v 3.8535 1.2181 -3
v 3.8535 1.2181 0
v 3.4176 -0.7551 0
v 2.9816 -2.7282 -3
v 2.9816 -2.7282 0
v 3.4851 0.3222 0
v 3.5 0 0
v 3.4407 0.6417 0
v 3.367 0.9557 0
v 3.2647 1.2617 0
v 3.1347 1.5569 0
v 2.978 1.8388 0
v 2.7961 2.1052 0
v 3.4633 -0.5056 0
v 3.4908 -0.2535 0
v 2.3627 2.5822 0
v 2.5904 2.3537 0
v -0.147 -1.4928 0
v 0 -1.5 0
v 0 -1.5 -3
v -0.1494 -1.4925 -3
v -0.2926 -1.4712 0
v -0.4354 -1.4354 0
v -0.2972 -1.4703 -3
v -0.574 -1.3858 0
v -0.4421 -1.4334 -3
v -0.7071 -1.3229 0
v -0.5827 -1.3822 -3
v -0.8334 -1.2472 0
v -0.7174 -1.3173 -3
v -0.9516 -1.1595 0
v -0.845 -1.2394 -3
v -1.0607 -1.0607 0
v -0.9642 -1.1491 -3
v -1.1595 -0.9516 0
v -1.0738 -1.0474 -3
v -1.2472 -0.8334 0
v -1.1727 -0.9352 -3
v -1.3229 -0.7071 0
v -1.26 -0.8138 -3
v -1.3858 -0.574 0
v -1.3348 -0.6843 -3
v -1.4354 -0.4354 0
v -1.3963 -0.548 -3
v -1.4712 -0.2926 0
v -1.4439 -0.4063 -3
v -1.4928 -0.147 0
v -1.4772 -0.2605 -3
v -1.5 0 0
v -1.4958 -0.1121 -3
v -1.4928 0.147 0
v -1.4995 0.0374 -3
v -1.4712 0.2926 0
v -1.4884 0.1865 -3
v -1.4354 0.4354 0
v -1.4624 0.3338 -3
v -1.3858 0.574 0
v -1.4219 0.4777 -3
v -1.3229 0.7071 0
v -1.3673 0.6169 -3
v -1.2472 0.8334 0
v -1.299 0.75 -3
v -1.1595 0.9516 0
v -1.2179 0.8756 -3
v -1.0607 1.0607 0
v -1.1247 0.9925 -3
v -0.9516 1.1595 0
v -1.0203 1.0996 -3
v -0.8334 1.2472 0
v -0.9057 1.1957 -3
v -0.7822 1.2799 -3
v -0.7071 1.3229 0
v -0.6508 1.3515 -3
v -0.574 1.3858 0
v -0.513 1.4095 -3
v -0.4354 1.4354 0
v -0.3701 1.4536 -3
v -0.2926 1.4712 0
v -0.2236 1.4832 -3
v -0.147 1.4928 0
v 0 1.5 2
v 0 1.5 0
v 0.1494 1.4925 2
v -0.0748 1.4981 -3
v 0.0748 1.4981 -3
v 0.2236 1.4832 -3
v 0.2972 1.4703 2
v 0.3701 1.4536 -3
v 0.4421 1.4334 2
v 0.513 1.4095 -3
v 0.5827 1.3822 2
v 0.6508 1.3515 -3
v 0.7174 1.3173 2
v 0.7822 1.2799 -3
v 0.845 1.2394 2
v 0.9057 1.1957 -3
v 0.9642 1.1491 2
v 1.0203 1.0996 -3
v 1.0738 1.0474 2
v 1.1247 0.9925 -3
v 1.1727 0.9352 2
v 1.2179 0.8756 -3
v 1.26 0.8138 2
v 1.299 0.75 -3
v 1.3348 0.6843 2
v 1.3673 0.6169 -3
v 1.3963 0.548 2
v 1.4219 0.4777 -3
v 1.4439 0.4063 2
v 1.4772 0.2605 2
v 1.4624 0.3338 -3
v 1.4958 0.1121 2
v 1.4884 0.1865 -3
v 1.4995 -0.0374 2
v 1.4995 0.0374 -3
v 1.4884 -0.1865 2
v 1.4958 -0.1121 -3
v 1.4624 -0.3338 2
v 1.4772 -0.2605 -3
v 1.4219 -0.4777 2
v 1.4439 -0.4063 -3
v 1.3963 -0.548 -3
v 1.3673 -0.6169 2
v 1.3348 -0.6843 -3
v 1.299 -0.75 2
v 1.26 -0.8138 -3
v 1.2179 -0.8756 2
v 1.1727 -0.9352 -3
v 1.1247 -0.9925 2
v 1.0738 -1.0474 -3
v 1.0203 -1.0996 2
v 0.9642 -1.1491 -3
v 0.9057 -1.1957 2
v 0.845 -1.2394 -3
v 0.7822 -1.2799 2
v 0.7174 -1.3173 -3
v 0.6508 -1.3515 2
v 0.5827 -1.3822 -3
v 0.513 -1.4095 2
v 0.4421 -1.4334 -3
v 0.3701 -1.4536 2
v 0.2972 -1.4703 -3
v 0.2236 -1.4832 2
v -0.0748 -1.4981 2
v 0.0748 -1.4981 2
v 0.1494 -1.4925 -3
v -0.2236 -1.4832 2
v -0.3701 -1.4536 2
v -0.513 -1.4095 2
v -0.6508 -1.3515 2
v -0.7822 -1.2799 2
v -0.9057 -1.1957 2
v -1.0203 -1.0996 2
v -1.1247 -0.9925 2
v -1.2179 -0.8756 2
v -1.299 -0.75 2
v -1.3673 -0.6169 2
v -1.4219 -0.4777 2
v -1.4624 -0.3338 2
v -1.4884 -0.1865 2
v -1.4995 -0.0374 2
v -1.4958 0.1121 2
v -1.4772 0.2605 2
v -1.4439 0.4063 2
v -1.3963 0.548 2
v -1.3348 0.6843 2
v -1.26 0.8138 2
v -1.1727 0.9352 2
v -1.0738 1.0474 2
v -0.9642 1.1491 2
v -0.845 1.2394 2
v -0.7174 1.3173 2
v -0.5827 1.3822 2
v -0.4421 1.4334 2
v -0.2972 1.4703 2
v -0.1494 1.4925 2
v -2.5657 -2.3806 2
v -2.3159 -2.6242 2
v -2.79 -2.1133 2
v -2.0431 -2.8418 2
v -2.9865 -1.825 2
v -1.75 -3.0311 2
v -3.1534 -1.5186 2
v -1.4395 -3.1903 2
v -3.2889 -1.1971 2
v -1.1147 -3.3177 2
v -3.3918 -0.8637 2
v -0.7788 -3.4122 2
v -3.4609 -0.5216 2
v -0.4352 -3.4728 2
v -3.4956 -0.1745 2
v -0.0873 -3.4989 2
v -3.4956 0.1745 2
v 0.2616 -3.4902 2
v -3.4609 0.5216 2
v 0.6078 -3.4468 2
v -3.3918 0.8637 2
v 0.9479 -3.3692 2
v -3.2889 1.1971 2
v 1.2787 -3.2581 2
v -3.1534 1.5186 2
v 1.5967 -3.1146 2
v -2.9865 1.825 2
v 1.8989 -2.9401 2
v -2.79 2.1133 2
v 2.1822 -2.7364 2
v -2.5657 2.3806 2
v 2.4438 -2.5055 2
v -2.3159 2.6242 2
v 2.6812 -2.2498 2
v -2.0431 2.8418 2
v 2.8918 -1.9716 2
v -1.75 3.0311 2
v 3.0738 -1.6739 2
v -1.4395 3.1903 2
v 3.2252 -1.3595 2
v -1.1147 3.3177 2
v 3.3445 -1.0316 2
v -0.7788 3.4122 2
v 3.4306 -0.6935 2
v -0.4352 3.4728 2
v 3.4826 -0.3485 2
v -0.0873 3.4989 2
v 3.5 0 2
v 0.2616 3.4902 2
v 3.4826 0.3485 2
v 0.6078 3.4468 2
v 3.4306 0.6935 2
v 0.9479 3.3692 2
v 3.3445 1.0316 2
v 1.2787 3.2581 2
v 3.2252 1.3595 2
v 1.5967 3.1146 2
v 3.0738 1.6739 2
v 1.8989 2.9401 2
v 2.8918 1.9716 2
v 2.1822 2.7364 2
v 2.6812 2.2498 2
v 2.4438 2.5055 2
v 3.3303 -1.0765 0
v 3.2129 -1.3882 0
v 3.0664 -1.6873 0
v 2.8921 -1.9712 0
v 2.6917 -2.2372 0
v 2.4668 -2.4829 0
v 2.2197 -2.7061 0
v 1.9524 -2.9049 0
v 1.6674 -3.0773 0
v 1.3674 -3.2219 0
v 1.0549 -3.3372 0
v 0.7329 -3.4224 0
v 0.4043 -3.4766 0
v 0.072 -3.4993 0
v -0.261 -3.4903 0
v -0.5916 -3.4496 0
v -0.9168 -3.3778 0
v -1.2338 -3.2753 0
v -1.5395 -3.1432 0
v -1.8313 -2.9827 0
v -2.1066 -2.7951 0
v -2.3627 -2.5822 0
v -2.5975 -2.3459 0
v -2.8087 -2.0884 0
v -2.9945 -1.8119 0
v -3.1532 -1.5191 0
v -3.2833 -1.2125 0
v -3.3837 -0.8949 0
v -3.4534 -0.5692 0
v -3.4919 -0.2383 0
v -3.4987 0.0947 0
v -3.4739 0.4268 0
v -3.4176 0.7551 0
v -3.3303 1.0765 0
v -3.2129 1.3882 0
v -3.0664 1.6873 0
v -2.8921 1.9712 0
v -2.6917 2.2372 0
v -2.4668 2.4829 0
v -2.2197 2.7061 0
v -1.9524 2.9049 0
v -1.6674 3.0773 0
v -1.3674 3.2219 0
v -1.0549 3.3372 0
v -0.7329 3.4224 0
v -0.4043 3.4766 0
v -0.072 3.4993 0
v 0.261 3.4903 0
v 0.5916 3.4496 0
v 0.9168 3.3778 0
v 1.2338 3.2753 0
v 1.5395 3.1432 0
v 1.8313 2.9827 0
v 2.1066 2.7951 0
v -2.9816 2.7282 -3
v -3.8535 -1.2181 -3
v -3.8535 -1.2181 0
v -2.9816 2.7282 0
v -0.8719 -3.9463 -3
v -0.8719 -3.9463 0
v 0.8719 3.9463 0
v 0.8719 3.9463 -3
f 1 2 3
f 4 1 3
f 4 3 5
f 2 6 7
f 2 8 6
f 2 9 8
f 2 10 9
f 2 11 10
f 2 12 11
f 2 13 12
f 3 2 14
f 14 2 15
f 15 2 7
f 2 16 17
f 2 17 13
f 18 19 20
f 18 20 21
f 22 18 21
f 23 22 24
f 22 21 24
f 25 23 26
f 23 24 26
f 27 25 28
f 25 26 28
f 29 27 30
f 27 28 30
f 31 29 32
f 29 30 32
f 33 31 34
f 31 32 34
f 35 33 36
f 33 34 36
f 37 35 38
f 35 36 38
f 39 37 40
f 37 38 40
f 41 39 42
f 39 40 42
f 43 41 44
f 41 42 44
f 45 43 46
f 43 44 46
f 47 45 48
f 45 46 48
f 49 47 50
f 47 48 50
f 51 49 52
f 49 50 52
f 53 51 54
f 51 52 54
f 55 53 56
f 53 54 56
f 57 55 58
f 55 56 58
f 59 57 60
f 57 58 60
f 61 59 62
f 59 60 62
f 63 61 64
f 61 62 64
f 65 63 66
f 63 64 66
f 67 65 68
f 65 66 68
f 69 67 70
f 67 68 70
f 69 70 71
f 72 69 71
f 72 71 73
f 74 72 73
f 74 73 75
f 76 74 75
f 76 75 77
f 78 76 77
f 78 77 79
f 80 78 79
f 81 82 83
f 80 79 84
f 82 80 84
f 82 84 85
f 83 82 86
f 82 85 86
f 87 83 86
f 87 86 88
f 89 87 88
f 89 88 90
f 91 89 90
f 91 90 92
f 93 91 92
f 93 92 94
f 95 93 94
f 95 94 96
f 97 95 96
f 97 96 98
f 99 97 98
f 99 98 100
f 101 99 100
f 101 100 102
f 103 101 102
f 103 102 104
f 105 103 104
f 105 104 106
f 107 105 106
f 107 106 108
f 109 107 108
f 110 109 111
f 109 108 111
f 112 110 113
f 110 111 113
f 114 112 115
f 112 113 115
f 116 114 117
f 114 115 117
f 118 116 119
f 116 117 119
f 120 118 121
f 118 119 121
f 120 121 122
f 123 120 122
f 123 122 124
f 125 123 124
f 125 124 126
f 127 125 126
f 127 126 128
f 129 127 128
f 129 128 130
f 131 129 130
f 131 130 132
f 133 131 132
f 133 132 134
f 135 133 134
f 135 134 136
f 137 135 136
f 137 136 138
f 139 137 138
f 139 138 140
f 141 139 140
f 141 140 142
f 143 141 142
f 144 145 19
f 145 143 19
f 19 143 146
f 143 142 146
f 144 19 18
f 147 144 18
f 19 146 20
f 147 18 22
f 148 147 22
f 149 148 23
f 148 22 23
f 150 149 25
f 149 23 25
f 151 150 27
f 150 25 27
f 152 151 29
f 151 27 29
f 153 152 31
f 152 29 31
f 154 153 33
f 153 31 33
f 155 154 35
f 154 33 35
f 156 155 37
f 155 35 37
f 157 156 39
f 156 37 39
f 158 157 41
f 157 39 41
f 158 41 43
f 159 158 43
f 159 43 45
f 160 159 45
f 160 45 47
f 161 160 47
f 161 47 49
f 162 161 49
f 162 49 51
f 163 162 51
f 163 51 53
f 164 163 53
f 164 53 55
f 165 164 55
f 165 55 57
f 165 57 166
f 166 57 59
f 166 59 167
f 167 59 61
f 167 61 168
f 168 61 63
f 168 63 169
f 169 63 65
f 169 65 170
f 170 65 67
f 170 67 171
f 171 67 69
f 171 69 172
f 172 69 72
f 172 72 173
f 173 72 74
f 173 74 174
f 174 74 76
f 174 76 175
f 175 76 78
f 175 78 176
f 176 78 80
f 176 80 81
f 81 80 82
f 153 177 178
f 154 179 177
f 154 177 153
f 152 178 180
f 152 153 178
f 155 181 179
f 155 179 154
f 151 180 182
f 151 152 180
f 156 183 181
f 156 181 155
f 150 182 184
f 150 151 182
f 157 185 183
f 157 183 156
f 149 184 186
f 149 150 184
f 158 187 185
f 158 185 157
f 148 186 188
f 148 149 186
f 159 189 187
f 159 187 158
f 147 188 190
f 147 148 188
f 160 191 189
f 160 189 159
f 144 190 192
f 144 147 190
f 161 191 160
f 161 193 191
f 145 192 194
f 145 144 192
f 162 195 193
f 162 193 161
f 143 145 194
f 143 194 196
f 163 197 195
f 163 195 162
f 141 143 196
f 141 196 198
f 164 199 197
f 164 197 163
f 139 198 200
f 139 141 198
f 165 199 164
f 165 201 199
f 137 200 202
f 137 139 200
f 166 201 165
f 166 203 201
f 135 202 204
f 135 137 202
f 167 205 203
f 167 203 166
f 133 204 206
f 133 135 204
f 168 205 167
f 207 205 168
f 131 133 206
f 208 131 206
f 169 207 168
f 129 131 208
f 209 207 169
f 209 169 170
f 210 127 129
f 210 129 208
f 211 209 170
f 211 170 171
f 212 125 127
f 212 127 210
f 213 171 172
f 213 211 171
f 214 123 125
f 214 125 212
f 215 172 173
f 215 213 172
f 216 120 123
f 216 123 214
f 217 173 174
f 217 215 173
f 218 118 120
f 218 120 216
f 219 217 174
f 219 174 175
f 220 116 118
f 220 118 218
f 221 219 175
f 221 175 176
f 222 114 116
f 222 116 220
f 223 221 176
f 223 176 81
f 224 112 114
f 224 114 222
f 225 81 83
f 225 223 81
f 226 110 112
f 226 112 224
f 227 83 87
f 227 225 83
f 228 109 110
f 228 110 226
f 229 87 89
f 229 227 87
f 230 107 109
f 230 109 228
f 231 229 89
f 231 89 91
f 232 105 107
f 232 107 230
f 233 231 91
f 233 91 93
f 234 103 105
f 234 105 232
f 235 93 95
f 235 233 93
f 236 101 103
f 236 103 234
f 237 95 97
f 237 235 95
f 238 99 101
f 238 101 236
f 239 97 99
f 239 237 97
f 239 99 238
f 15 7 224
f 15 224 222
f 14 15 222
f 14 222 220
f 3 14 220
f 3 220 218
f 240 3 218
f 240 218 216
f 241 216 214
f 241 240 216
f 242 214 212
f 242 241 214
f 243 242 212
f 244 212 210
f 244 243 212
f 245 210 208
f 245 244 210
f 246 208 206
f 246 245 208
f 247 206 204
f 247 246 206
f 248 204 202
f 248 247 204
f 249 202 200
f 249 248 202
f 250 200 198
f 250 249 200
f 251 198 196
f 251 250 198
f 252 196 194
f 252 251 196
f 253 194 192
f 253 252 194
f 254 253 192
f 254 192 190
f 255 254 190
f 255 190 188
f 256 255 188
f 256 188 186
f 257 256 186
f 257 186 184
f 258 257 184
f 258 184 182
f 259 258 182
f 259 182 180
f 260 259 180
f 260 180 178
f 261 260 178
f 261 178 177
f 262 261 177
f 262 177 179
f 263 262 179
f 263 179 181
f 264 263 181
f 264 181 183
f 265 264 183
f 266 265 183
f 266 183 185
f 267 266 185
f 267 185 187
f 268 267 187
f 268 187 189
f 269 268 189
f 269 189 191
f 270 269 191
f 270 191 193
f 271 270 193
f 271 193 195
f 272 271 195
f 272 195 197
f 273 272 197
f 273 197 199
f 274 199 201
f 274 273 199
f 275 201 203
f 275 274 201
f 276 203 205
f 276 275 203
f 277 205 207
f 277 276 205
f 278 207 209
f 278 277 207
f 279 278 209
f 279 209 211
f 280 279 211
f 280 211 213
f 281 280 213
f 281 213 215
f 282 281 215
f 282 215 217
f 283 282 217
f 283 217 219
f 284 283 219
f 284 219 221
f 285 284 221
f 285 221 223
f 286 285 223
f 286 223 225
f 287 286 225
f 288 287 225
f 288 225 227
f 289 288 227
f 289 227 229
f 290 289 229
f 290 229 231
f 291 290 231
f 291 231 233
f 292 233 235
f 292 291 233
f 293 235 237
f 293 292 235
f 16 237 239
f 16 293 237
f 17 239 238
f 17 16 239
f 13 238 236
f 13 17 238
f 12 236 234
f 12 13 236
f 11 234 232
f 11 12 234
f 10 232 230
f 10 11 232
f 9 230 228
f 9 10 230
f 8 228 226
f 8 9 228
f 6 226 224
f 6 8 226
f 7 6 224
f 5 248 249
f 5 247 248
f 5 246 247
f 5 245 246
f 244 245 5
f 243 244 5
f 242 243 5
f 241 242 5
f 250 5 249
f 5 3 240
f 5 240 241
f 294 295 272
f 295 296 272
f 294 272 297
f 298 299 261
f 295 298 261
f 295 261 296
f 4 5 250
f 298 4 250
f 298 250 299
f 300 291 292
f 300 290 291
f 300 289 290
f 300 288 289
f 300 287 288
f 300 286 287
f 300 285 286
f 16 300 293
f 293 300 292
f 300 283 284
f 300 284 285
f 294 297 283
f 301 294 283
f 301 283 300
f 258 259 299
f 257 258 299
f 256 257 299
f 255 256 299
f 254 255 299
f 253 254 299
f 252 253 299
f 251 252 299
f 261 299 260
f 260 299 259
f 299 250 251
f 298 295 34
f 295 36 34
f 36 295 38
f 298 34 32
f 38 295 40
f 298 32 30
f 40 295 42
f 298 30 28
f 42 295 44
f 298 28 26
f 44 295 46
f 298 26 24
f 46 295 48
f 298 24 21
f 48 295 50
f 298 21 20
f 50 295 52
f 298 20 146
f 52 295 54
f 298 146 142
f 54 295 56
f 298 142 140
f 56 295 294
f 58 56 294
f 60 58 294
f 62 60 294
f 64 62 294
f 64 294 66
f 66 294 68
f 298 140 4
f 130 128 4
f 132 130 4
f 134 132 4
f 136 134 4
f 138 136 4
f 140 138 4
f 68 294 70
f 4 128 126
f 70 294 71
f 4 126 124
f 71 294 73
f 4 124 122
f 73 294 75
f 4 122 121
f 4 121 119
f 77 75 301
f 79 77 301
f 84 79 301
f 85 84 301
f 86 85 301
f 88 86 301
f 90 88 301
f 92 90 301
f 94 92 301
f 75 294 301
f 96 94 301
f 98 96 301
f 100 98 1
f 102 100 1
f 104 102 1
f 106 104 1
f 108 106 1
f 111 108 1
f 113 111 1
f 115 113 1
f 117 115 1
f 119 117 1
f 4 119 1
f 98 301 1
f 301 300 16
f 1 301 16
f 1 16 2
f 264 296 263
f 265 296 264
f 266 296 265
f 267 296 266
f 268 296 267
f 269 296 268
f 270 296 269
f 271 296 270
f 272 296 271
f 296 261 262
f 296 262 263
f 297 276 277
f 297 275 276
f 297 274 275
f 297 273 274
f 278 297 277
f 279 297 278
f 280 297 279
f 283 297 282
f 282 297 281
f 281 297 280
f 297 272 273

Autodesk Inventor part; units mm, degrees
ref_plane "YZ Plane" through (0, 0, 0) normal (1, 0, 0) x (0, 1, 0)
ref_plane "XZ Plane" through (0, 0, 0) normal (0, 1, 0) x (-1, 0, 0)
ref_plane "XY Plane" through (0, 0, 0) normal (0, 0, 1) x (1, 0, 0)
sketch "スケッチ1" plane through (0, 0, 0) normal (0, 0, 1) x (1, 0, 0)
  line L0 (3.8535, 1.2181) -> (2.9816, -2.7282)
  line L1 (2.9816, -2.7282) -> (-0.8719, -3.9463)
  line L2 (-0.8719, -3.9463) -> (-3.8535, -1.2181)
  line L3 (-3.8535, -1.2181) -> (-2.9816, 2.7282)
  line L4 (-2.9816, 2.7282) -> (0.8719, 3.9463)
  line L5 (0.8719, 3.9463) -> (3.8535, 1.2181)
  circle A0 centre (0, 0) radius 3.5
  dimension "d0" = 8.0829
  dimension "d1" = 7
extrude "押し出し1" add sketch "スケッチ1" along normal blind 2 contours A0
extrude "押し出し2" add sketch "スケッチ1" against normal blind 3
hole "穴1" at (0, 0, 0) direction (0, 0, -1) diameter 3 end through all
hole "穴2" at (0, 0, 0) direction (0, 0, 1) diameter 3 end through all
properties part number "ナイロンナットm4" material "ステンレス鋼"
